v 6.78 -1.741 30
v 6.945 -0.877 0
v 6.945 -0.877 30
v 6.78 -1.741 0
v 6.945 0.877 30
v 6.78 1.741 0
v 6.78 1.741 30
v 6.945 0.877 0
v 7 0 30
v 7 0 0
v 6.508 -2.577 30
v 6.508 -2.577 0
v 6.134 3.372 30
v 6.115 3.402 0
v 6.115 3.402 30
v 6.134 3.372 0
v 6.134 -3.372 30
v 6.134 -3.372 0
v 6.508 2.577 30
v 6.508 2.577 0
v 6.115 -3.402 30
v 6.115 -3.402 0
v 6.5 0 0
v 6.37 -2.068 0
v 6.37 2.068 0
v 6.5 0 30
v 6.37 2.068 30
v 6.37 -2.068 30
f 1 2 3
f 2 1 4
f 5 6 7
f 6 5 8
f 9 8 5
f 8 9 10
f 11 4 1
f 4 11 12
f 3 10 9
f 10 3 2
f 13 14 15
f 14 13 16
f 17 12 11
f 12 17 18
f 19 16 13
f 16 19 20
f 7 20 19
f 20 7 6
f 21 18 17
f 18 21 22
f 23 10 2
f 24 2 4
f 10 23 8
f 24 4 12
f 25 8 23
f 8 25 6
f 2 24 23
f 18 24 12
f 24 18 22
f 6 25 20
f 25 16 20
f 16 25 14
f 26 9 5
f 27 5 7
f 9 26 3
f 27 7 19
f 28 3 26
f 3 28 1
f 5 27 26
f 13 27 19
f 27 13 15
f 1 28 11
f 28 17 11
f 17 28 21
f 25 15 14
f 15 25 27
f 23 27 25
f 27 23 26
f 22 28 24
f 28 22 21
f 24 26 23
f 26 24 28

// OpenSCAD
$fn = 50;


difference() {
	union() {
		cylinder(h = 30, r = 7.0000000000);
		translate(v = [-13.0000000000, 0, 0]) {
			cylinder(h = 30, r = 7.0000000000);
		}
	}
	union() {
		cylinder(h = 30, r = 3.2500000000);
		cylinder(h = 30, r = 1.8000000000);
		cylinder(h = 30, r = 1.8000000000);
		cylinder(h = 30, r = 1.8000000000);
		translate(v = [-17.5000000000, 0, 0]) {
			hull() {
				translate(v = [-3.7500000000, 0.0000000000, 0]) {
					cylinder(h = 30, r = 7.5000000000);
				}
				translate(v = [3.7500000000, 0.0000000000, 0]) {
					cylinder(h = 30, r = 7.5000000000);
				}
				translate(v = [-3.7500000000, -0.0000000000, 0]) {
					cylinder(h = 30, r = 7.5000000000);
				}
				translate(v = [3.7500000000, -0.0000000000, 0]) {
					cylinder(h = 30, r = 7.5000000000);
				}
			}
		}
		translate(v = [-10.0000000000, 0, 0.0000000000]) {
			cylinder(h = 30, r = 16.5000000000);
		}
	}
}
